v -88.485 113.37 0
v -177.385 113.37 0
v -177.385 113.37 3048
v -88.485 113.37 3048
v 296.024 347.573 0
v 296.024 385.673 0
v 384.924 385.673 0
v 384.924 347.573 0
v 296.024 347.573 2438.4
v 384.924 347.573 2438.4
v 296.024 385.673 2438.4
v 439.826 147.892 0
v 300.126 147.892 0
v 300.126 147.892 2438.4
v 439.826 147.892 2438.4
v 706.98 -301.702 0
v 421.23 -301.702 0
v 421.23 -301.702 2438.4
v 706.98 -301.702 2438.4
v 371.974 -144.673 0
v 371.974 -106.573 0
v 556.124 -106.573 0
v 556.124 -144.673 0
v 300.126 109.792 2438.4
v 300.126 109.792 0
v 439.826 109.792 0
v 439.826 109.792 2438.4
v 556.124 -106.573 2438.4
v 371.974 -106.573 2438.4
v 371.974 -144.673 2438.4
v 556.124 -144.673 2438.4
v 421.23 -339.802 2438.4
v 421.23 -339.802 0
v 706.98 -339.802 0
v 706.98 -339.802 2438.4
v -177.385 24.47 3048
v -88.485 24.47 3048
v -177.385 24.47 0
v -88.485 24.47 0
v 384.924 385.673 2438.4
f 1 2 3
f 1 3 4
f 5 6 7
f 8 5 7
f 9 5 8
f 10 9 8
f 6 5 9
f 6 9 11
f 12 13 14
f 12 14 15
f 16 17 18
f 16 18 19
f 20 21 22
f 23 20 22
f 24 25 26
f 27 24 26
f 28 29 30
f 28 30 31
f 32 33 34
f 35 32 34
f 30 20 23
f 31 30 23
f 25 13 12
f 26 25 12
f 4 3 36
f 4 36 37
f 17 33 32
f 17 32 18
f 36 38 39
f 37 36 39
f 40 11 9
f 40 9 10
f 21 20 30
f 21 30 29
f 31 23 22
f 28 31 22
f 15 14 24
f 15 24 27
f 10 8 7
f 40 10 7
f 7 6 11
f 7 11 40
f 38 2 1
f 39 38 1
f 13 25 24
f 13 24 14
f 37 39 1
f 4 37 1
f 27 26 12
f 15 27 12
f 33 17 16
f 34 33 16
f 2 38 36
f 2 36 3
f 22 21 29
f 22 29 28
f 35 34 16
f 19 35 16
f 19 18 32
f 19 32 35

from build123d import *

# Parameters (mm, degrees)
F0_W     = 88.9
F0_H     = 88.9
F1_DEPTH = 3048
F2_W     = 88.9
F2_H     = 38.1
F3_DEPTH = 2438.4
F4_W     = 139.7
F4_H     = 38.1
F5_DEPTH = 2438.4
F6_W     = 184.15
F6_H     = 38.1
F7_DEPTH = 2438.4
F8_W     = 285.75
F8_H     = 38.1
F9_DEPTH = 2438.4


with BuildPart() as f1:
    # F0 (on Top) → F1 (new body)
    with BuildSketch(Plane.XY):
        with Locations((-132.935271, 68.920017)):
            Rectangle(F0_W, F0_H)
    extrude(amount=F1_DEPTH)


with BuildPart() as f3:
    # F2 (on Top) → F3 (new body)
    with BuildSketch(Plane.XY):
        with Locations((340.474084, 366.623222)):
            Rectangle(F2_W, F2_H)
    extrude(amount=F3_DEPTH)


with BuildPart() as f5:
    # F4 (on Top) → F5 (new body)
    with BuildSketch(Plane.XY):
        with Locations((369.976213, 128.842231)):
            Rectangle(F4_W, F4_H)
    extrude(amount=F5_DEPTH)


with BuildPart() as f7:
    # F6 (on Top) → F7 (new body)
    with BuildSketch(Plane.XY):
        with Locations((464.049177, -125.622984)):
            Rectangle(F6_W, F6_H)
    extrude(amount=F7_DEPTH)


with BuildPart() as f9:
    # F8 (on Top) → F9 (new body)
    with BuildSketch(Plane.XY):
        with Locations((564.105356, -320.752116)):
            Rectangle(F8_W, F8_H)
    extrude(amount=F9_DEPTH)


solid = Compound([f1.part, f3.part, f5.part, f7.part, f9.part])
